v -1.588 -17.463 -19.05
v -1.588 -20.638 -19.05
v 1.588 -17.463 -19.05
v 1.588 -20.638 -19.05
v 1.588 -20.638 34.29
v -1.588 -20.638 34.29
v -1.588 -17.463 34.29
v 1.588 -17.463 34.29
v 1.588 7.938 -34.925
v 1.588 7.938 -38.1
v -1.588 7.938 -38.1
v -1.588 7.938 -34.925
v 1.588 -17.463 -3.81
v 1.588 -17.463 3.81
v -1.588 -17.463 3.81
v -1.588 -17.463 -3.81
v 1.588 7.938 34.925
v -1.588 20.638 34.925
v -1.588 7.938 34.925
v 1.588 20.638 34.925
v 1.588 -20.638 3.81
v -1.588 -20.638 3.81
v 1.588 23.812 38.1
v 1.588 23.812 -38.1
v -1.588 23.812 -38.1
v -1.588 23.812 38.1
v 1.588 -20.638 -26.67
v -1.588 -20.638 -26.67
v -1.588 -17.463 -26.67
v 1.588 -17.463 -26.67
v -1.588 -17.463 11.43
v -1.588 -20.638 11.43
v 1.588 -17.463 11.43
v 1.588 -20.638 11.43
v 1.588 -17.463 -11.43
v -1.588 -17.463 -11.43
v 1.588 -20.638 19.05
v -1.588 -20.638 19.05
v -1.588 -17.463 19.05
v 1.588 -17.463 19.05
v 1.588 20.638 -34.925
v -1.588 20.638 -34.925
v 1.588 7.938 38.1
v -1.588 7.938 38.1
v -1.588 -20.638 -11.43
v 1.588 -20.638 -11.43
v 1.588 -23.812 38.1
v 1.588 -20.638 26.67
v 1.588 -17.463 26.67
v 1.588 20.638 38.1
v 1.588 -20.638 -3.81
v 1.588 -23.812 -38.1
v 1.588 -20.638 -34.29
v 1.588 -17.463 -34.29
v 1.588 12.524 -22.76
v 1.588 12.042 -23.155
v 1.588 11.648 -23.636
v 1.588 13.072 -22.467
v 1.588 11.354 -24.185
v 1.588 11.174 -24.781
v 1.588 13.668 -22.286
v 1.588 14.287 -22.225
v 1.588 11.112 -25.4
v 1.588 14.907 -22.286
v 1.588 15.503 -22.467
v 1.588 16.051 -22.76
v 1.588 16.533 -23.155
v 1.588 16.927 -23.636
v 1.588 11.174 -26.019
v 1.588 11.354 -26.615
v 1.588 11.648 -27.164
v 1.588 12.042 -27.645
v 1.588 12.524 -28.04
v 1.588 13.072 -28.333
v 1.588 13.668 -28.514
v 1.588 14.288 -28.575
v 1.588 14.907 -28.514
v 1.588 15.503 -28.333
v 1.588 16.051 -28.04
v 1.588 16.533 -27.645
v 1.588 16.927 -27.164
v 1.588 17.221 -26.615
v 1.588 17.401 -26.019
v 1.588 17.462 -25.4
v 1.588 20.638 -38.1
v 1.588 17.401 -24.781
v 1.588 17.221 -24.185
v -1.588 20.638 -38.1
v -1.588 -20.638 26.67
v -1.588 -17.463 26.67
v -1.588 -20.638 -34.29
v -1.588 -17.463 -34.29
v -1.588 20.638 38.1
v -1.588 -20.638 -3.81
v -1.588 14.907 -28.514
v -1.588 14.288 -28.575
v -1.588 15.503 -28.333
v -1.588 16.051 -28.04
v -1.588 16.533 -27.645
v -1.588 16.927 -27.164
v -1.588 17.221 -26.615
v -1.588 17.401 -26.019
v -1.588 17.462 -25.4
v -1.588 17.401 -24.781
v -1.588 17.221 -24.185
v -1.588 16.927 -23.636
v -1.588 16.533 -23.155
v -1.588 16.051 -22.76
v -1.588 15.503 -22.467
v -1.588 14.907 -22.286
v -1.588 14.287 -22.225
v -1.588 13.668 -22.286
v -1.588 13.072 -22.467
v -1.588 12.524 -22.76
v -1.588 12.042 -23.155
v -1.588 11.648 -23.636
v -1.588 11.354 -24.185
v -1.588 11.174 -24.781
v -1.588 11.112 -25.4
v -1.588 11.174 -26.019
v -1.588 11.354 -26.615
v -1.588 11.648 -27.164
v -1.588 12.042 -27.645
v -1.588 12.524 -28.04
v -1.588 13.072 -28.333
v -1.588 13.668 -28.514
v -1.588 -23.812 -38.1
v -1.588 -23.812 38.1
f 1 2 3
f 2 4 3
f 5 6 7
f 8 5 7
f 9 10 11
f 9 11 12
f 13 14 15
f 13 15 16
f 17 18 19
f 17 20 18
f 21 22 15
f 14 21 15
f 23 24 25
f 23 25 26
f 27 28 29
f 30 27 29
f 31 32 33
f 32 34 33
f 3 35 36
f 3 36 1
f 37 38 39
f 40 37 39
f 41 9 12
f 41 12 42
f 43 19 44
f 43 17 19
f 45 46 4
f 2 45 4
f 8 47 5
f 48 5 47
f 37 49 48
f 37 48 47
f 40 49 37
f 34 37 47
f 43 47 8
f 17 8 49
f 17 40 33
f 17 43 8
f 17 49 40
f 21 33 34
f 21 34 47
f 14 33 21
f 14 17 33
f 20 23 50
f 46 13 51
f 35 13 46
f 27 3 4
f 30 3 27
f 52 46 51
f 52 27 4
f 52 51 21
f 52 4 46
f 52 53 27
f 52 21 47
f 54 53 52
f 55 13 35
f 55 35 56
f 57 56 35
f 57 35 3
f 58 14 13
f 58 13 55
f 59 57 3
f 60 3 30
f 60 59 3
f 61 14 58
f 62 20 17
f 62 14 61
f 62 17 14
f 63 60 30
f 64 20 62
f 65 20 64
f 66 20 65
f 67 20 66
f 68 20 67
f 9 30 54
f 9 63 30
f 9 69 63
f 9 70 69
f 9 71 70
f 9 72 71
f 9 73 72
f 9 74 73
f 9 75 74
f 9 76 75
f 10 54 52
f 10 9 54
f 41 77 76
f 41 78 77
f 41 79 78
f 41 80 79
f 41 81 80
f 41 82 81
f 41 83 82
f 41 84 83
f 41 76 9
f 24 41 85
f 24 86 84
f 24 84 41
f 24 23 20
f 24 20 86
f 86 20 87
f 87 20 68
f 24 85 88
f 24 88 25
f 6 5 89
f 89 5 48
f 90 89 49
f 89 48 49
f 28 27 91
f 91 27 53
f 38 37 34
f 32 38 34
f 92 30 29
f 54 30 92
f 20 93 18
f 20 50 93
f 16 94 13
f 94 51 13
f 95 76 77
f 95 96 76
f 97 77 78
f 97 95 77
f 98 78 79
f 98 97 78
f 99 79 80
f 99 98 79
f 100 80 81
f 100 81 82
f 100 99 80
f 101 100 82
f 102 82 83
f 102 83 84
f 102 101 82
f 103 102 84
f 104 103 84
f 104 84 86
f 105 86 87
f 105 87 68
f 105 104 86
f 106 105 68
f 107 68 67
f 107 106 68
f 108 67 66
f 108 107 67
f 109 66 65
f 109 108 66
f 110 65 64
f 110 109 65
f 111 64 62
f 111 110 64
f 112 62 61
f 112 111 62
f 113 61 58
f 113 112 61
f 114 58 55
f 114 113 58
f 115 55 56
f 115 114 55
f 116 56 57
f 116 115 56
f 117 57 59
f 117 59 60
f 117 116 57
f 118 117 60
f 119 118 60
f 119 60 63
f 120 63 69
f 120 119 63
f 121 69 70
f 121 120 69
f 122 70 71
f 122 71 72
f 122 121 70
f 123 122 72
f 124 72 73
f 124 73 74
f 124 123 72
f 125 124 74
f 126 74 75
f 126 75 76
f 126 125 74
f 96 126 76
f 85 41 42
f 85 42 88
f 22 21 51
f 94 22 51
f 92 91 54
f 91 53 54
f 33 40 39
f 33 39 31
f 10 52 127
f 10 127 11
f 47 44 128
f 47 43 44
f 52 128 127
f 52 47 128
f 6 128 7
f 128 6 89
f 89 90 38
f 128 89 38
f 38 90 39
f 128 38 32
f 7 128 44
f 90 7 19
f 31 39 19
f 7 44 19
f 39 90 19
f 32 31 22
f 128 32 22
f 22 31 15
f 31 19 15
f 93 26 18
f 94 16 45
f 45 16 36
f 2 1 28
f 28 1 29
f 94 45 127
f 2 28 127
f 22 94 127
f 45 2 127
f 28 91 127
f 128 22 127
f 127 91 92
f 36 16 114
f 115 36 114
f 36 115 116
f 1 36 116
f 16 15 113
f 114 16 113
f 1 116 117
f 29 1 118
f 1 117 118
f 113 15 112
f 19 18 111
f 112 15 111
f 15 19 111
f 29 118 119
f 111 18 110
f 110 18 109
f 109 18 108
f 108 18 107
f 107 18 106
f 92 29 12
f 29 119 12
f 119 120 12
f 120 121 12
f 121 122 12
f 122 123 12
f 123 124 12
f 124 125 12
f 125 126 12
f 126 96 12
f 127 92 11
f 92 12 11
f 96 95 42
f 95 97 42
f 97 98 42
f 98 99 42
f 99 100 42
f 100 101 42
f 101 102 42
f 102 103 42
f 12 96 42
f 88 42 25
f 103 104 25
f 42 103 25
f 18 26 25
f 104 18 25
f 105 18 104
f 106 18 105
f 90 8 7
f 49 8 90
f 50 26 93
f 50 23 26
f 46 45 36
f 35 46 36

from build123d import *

# Parameters (mm, degrees)
SKETCH1_R           = 3.175
SKETCH1_W           = 7.62
SKETCH1_H           = 3.175
BOSS_EXTRUDE1_DEPTH = 1.5875


with BuildPart() as part:
    # Sketch1 → Boss-Extrude1 (new body, symmetric)
    with BuildSketch(Plane(origin=(0, 0, 0), x_dir=(0, 0, -1), z_dir=(1, 0, 0))):
        Polygon((-38.1, -23.8125), (38.1, -23.8125), (38.1, 7.9375), (34.925, 7.9375), (34.925, 20.6375), (38.1, 20.6375), (38.1, 23.8125), (-38.1, 23.8125), (-38.1, 20.6375), (-34.925, 20.6375), (-34.925, 7.9375), (-38.1, 7.9375), align=None)
        with Locations((25.4, 14.2875)):
            Circle(SKETCH1_R, mode=Mode.SUBTRACT)
        with Locations((-15.24, -19.05)):
            Rectangle(SKETCH1_W, SKETCH1_H, mode=Mode.SUBTRACT)
        with Locations((-30.48, -19.05)):
            Rectangle(SKETCH1_W, SKETCH1_H, mode=Mode.SUBTRACT)
        with Locations((0, -19.05)):
            Rectangle(SKETCH1_W, SKETCH1_H, mode=Mode.SUBTRACT)
        with Locations((15.24, -19.05)):
            Rectangle(SKETCH1_W, SKETCH1_H, mode=Mode.SUBTRACT)
        with Locations((30.48, -19.05)):
            Rectangle(SKETCH1_W, SKETCH1_H, mode=Mode.SUBTRACT)
    extrude(amount=BOSS_EXTRUDE1_DEPTH, both=True)


solid = part.part
